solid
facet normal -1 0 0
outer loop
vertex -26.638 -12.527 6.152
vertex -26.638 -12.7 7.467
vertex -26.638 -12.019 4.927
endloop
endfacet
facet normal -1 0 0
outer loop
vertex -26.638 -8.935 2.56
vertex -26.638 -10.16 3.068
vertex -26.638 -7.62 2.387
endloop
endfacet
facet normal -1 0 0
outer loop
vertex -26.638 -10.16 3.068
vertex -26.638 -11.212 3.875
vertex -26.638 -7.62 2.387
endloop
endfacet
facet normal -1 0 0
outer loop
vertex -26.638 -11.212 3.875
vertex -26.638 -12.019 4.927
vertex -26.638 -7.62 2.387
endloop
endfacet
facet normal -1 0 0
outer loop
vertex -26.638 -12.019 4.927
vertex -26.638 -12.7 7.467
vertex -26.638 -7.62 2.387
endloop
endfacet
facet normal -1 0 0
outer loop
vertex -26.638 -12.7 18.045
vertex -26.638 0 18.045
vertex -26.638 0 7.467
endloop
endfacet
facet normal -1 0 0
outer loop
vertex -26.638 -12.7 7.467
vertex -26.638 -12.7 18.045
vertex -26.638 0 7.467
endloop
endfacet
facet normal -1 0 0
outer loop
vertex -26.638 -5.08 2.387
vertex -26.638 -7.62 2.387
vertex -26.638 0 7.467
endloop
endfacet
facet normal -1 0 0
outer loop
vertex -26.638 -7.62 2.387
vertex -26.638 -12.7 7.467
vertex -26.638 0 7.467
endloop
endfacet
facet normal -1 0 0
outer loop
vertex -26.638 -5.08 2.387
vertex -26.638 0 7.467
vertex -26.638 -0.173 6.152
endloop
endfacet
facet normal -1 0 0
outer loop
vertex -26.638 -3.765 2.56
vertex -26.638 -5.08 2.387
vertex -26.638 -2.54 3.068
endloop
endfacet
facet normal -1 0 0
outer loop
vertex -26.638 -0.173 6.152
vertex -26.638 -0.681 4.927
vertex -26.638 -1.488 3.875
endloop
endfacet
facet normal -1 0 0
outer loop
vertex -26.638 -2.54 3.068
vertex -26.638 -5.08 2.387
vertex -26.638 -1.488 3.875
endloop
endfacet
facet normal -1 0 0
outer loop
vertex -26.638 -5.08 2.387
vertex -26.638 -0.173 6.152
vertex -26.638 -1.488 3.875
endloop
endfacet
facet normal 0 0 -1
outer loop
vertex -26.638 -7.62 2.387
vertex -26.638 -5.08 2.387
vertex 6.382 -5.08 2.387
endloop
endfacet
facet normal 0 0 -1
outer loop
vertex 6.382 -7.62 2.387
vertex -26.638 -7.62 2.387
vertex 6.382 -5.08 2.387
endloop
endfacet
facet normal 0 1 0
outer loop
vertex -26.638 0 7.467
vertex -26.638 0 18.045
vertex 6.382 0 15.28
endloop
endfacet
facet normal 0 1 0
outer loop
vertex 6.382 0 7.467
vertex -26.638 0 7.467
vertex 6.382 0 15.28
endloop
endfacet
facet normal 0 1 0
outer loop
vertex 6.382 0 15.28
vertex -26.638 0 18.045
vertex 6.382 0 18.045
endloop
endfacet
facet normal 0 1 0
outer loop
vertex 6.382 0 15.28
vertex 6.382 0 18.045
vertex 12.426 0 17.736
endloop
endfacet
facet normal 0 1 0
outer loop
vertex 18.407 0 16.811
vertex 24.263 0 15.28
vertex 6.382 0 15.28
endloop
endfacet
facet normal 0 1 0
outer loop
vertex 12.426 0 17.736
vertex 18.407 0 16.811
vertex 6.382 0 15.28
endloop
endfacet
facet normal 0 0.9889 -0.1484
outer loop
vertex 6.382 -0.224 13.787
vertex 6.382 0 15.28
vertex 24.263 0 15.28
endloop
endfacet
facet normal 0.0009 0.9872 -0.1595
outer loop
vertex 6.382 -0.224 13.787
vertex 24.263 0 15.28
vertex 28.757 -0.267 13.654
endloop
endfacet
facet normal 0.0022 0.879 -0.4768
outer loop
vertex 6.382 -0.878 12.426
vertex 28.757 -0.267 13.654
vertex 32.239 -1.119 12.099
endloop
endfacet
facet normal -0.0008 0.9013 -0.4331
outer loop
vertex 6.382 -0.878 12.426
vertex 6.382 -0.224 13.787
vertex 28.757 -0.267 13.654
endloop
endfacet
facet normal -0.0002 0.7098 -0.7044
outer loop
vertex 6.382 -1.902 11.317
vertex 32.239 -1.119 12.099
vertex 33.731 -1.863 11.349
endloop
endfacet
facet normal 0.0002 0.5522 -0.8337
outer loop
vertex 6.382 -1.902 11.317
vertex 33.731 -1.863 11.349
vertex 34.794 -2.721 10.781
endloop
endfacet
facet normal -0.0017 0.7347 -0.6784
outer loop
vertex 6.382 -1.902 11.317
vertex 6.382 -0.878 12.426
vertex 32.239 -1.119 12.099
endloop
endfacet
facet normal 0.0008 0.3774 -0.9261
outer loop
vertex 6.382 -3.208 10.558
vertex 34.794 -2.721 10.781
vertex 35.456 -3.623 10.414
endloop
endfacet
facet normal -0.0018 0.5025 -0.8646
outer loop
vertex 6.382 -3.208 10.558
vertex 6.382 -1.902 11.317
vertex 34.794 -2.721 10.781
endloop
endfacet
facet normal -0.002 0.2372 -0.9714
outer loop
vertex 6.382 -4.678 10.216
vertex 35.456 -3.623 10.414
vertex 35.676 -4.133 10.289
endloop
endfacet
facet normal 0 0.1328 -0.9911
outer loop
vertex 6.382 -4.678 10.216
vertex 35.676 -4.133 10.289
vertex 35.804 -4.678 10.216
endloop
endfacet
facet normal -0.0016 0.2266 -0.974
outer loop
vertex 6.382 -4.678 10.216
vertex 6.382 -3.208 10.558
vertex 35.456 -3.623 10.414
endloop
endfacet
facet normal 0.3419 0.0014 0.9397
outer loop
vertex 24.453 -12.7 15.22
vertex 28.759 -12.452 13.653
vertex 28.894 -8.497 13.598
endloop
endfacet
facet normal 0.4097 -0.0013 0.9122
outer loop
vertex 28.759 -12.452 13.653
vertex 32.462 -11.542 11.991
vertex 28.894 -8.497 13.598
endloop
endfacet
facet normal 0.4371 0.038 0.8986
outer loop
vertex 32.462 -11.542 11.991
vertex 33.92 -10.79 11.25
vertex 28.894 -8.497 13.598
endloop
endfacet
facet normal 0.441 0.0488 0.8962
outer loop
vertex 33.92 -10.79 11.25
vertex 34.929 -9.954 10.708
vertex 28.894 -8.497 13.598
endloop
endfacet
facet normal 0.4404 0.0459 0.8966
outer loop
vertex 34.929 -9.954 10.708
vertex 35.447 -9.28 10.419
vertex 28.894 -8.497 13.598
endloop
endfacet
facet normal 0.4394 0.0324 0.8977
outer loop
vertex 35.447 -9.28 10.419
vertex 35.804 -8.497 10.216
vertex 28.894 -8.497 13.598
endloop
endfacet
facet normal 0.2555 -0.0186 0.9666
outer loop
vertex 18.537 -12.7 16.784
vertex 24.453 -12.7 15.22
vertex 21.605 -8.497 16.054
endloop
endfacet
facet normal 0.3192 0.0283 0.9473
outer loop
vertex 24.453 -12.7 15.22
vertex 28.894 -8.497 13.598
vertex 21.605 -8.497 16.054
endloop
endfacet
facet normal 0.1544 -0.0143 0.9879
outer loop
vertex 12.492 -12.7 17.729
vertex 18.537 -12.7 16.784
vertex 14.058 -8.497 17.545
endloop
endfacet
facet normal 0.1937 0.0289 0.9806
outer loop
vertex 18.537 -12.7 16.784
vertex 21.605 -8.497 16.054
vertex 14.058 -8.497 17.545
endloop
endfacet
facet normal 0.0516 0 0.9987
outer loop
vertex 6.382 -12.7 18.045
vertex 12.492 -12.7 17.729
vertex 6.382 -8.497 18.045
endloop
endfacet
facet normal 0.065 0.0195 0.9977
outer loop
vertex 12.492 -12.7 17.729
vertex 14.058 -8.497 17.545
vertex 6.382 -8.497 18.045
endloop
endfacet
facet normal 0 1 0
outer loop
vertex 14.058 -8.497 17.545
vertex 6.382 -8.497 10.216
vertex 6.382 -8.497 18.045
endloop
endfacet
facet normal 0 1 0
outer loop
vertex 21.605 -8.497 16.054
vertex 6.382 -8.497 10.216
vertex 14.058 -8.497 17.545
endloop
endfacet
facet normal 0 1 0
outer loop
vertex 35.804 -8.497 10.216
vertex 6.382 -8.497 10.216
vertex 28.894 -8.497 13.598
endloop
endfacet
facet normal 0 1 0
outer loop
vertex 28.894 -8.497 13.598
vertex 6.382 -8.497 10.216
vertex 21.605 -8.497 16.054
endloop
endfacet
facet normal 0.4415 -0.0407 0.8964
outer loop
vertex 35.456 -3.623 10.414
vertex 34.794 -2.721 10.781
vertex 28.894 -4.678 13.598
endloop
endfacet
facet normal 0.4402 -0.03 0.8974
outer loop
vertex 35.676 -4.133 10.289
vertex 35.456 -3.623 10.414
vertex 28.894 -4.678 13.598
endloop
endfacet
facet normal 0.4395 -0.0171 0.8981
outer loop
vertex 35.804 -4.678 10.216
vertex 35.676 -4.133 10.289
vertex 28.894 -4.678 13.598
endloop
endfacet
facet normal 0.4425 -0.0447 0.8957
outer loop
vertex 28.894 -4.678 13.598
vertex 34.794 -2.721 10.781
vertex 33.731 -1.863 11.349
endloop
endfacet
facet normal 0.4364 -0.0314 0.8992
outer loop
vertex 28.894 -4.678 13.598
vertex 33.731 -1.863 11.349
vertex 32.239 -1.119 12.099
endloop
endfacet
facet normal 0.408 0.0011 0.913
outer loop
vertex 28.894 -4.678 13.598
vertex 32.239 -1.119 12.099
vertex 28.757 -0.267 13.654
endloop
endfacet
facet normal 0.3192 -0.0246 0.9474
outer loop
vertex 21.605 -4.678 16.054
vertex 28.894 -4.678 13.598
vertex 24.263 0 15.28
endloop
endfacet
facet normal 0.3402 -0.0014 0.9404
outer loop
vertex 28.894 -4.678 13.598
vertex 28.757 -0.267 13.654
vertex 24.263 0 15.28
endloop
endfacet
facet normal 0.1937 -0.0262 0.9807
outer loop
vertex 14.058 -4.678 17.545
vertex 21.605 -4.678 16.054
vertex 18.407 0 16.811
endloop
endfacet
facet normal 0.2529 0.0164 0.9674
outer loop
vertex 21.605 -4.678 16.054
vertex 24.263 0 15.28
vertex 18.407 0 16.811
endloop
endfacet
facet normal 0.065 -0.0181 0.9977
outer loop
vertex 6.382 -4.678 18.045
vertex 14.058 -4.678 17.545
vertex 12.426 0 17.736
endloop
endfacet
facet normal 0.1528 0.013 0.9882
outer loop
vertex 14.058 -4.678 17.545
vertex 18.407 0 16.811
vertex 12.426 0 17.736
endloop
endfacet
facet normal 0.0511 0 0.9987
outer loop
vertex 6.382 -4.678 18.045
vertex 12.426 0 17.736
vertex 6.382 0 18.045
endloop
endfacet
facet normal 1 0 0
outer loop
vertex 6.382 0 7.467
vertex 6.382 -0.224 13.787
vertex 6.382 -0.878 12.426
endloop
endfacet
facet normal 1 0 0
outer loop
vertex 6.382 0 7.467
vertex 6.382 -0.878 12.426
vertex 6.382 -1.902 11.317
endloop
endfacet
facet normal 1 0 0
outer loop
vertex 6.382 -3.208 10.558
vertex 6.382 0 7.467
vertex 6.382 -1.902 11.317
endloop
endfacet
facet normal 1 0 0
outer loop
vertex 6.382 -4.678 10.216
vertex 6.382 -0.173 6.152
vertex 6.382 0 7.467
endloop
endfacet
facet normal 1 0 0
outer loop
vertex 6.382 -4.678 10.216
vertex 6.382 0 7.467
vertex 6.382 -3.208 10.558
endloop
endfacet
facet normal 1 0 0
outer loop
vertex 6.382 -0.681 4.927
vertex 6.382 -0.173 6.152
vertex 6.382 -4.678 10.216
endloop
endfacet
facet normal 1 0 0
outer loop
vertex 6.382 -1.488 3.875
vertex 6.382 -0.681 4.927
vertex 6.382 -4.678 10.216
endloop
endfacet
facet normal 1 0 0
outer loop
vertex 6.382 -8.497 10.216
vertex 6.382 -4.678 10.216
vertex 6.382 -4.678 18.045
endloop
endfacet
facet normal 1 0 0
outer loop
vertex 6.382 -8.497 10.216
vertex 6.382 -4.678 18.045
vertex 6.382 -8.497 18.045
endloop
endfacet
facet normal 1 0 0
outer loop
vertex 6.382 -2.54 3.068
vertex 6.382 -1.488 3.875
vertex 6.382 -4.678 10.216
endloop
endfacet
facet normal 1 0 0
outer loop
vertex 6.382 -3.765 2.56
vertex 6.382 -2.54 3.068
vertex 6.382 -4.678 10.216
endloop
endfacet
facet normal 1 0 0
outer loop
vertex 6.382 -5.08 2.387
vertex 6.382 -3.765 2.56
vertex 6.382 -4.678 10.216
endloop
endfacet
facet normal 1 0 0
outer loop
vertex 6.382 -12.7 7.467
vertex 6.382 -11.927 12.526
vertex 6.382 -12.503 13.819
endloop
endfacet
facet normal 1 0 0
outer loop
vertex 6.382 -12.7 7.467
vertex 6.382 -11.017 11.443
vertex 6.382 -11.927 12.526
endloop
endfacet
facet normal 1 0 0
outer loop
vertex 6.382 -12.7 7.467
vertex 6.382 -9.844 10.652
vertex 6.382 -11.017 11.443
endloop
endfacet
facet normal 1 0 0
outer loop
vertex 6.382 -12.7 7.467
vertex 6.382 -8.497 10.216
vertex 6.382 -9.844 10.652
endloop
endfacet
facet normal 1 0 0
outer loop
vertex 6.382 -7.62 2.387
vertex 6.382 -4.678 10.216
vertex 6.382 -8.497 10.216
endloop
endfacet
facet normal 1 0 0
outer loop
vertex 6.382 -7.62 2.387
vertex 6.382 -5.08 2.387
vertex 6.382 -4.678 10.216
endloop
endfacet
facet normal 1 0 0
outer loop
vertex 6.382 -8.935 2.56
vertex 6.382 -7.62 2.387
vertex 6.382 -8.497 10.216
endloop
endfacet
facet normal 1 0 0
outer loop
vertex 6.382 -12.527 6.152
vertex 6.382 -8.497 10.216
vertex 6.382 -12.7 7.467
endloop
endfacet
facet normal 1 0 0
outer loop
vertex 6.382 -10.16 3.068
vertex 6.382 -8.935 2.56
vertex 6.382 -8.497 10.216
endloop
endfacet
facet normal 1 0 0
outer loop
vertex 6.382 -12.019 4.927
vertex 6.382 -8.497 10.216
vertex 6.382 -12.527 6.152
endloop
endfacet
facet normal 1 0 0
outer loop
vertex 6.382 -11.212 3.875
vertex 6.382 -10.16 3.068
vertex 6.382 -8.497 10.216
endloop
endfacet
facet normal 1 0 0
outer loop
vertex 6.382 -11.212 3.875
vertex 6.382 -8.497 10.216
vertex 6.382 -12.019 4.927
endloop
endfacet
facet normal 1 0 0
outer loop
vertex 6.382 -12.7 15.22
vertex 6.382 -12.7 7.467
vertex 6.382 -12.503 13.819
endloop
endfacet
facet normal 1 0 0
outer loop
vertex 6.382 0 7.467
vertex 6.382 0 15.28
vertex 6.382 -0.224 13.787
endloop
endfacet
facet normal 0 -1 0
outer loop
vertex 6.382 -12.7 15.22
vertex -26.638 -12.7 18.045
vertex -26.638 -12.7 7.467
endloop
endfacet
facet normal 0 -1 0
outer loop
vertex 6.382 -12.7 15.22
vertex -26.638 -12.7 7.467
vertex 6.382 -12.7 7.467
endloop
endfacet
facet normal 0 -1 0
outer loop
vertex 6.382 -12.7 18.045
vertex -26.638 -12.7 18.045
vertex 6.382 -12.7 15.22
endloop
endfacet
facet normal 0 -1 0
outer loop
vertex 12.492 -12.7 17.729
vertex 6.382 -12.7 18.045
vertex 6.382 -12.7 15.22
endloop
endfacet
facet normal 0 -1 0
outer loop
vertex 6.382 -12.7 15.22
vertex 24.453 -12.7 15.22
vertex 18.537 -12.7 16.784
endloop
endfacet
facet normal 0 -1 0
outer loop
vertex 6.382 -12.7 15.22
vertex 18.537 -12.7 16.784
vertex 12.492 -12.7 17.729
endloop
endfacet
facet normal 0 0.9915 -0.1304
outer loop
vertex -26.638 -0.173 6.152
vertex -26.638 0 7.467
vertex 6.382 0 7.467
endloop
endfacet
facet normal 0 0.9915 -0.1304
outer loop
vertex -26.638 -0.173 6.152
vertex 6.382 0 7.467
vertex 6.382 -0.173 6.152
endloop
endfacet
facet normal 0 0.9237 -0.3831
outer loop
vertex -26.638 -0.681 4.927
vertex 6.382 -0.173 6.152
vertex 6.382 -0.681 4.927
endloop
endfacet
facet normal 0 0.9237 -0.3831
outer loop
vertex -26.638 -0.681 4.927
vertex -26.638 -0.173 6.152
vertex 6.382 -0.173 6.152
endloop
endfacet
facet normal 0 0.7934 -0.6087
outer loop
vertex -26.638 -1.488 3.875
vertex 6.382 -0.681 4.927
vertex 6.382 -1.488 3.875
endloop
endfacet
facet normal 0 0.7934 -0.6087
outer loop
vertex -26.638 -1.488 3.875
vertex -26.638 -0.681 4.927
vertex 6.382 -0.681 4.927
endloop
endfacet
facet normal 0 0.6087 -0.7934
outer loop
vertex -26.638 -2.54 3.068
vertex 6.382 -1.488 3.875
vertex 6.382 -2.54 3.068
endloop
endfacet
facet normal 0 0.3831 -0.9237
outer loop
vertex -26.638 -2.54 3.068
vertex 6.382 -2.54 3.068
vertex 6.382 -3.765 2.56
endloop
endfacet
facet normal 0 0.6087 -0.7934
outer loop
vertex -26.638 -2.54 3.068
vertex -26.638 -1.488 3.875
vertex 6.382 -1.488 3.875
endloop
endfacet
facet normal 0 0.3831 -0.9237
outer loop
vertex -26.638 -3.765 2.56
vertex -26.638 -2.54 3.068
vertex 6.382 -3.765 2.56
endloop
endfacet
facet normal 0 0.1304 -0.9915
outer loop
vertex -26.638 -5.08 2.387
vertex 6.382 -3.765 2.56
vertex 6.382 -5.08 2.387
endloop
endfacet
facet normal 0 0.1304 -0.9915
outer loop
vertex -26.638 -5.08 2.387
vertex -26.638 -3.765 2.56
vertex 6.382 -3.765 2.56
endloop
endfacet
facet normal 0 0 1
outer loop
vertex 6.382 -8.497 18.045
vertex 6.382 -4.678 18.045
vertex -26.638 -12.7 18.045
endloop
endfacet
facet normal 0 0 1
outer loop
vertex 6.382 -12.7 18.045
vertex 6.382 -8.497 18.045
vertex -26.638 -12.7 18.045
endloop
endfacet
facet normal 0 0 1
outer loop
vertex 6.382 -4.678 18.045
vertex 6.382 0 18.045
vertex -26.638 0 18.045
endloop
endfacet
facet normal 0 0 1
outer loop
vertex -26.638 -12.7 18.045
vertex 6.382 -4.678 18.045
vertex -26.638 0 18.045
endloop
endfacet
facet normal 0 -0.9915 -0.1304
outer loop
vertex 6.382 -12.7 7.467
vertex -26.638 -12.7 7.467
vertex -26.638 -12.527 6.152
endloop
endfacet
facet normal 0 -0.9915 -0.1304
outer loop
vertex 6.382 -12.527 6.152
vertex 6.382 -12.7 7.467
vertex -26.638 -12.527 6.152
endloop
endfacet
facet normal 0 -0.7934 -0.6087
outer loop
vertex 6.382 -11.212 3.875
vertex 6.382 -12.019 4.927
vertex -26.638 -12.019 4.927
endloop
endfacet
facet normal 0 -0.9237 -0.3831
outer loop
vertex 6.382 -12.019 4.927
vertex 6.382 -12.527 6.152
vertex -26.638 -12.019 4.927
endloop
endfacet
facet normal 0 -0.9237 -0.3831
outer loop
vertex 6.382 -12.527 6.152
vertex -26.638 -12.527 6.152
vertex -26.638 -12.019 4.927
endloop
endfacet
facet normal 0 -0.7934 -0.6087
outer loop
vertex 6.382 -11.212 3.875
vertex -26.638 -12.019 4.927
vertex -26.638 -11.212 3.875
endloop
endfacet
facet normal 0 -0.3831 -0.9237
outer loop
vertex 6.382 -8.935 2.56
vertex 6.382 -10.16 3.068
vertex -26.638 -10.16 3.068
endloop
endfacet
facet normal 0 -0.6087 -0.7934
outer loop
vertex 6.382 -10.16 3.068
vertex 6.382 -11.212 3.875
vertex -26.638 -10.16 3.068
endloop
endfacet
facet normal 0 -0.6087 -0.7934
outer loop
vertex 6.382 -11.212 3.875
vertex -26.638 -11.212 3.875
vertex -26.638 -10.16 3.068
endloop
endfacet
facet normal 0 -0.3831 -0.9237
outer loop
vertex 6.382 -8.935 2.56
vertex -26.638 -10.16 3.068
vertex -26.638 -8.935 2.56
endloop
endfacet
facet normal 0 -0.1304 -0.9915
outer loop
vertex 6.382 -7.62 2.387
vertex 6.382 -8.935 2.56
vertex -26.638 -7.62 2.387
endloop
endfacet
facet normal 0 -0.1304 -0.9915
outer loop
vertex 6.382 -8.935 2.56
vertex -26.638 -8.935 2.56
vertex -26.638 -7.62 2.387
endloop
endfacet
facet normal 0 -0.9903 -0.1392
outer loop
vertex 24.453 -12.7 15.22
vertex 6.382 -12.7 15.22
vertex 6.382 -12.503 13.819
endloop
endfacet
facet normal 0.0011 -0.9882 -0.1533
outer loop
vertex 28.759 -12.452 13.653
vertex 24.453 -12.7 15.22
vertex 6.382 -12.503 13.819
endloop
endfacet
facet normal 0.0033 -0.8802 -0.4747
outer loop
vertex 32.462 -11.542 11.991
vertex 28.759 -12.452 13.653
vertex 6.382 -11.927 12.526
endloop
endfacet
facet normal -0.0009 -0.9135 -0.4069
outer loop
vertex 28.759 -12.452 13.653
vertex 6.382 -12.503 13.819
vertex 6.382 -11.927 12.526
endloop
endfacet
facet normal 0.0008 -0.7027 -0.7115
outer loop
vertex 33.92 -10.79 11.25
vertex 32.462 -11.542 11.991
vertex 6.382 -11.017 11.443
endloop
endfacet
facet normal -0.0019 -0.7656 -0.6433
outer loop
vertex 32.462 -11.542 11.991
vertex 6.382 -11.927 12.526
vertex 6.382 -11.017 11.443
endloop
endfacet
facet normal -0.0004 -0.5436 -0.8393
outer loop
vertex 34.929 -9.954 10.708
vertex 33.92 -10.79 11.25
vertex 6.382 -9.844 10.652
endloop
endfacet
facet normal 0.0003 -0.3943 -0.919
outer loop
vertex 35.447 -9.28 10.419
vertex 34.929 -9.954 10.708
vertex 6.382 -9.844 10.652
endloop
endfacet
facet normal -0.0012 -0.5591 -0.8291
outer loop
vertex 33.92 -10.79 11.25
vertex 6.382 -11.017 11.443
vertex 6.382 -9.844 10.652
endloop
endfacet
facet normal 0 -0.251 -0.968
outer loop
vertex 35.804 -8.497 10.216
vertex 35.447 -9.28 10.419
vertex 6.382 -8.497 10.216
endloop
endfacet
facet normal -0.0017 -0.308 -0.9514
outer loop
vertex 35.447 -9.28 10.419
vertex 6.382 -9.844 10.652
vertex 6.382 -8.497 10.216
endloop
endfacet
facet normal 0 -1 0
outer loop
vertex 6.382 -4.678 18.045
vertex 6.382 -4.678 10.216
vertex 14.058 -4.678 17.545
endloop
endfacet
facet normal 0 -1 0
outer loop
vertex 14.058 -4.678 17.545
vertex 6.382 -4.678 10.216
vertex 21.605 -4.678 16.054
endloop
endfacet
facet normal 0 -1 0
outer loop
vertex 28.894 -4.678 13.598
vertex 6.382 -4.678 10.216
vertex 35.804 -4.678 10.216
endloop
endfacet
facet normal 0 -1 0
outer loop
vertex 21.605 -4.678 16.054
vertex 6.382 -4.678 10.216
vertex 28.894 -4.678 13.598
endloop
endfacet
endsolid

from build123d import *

# Parameters (mm, degrees)
F1_DEPTH    = 12.7
F2_W        = 29.4221741813
F2_H        = 3.8190931082
F3_DEPTH    = 25.4
F4_T1_DEPTH = 58.42
F4_T3_DEPTH = 41.9312775373
F4_T5_DEPTH = 42.0824239574


# Not quite as in the source:
# - a fillet or chamfer that OpenCascade refuses, or shapes differently, is made with other operations: its cross-section is extruded or revolved along the edge and cut away or added


with BuildPart() as f1:
    # F0 (on Front) → F1 (new body)
    with BuildSketch(Plane.XZ):
        Polygon((6.3818255705, 18.0452149361), (-26.6381744295, 18.0452149361), (-26.6381744295, 2.3869331926), (6.3818255705, 2.3869331926), (6.3818255705, 10.2160740644), align=None)
        with BuildLine():
            ThreePointArc((35.8039997518, 10.2160740644), (21.6048326678, 16.0544570681), (6.3818255705, 18.0452149361))
            Line((6.3818255705, 18.0452149361), (6.3818255705, 10.2160740644))
            Line((6.3818255705, 10.2160740644), (35.8039997518, 10.2160740644))
        make_face()
    extrude(amount=F1_DEPTH)

    # F2 (on face) → F3 (cut)
    with BuildSketch(Plane(origin=(0, 0, 10.2160740644), x_dir=(1, 0, 0), z_dir=(0, 0, -1))):
        with Locations((21.0929126611, 6.5879346803)):
            Rectangle(F2_W, F2_H)
    extrude(amount=-F3_DEPTH, mode=Mode.SUBTRACT)

    # F4: fillet of radius 5.08 on 4 edges, made by hand

    # F4_s2 → F4_t1 (cut)
    with BuildSketch(Plane.YZ.offset(-39.3381744295)):
        with BuildLine():
            ThreePointArc((-12.7, 7.4669331926), (-11.2121024484, 3.8748307442), (-7.62, 2.3869331926))
            Line((-7.62, 2.3869331926), (-12.7, 2.3869331926))
            Line((-12.7, 2.3869331926), (-12.7, 7.4669331926))
        make_face()
        with BuildLine():
            ThreePointArc((0, 7.4669331926), (-1.4878975516, 3.8748307442), (-5.08, 2.3869331926))
            Line((-5.08, 2.3869331926), (0, 2.3869331926))
            Line((0, 2.3869331926), (0, 7.4669331926))
        make_face()
    extrude(amount=F4_T1_DEPTH, mode=Mode.SUBTRACT)

    # F4_s4 → F4_t3 (cut)
    with BuildSketch(Plane.YZ.offset(6.3818255705)):
        with BuildLine():
            ThreePointArc((-12.7, 15.2197154068), (-11.5099874467, 11.9525457349), (-8.4974812344, 10.2160740644))
            Line((-8.4974812344, 10.2160740644), (-12.7, 10.2160740644))
            Line((-12.7, 10.2160740644), (-12.7, 15.2197154068))
        make_face()
    extrude(amount=F4_T3_DEPTH, mode=Mode.SUBTRACT)

    # F4_s6 → F4_t5 (cut)
    with BuildSketch(Plane.YZ.offset(6.3818255705)):
        with BuildLine():
            ThreePointArc((0, 15.2801739748), (-1.3486069412, 11.8329858685), (-4.6783881262, 10.2160740644))
            Line((-4.6783881262, 10.2160740644), (0, 10.2160740644))
            Line((0, 10.2160740644), (0, 15.2801739748))
        make_face()
    extrude(amount=F4_T5_DEPTH, mode=Mode.SUBTRACT)


solid = f1.part
